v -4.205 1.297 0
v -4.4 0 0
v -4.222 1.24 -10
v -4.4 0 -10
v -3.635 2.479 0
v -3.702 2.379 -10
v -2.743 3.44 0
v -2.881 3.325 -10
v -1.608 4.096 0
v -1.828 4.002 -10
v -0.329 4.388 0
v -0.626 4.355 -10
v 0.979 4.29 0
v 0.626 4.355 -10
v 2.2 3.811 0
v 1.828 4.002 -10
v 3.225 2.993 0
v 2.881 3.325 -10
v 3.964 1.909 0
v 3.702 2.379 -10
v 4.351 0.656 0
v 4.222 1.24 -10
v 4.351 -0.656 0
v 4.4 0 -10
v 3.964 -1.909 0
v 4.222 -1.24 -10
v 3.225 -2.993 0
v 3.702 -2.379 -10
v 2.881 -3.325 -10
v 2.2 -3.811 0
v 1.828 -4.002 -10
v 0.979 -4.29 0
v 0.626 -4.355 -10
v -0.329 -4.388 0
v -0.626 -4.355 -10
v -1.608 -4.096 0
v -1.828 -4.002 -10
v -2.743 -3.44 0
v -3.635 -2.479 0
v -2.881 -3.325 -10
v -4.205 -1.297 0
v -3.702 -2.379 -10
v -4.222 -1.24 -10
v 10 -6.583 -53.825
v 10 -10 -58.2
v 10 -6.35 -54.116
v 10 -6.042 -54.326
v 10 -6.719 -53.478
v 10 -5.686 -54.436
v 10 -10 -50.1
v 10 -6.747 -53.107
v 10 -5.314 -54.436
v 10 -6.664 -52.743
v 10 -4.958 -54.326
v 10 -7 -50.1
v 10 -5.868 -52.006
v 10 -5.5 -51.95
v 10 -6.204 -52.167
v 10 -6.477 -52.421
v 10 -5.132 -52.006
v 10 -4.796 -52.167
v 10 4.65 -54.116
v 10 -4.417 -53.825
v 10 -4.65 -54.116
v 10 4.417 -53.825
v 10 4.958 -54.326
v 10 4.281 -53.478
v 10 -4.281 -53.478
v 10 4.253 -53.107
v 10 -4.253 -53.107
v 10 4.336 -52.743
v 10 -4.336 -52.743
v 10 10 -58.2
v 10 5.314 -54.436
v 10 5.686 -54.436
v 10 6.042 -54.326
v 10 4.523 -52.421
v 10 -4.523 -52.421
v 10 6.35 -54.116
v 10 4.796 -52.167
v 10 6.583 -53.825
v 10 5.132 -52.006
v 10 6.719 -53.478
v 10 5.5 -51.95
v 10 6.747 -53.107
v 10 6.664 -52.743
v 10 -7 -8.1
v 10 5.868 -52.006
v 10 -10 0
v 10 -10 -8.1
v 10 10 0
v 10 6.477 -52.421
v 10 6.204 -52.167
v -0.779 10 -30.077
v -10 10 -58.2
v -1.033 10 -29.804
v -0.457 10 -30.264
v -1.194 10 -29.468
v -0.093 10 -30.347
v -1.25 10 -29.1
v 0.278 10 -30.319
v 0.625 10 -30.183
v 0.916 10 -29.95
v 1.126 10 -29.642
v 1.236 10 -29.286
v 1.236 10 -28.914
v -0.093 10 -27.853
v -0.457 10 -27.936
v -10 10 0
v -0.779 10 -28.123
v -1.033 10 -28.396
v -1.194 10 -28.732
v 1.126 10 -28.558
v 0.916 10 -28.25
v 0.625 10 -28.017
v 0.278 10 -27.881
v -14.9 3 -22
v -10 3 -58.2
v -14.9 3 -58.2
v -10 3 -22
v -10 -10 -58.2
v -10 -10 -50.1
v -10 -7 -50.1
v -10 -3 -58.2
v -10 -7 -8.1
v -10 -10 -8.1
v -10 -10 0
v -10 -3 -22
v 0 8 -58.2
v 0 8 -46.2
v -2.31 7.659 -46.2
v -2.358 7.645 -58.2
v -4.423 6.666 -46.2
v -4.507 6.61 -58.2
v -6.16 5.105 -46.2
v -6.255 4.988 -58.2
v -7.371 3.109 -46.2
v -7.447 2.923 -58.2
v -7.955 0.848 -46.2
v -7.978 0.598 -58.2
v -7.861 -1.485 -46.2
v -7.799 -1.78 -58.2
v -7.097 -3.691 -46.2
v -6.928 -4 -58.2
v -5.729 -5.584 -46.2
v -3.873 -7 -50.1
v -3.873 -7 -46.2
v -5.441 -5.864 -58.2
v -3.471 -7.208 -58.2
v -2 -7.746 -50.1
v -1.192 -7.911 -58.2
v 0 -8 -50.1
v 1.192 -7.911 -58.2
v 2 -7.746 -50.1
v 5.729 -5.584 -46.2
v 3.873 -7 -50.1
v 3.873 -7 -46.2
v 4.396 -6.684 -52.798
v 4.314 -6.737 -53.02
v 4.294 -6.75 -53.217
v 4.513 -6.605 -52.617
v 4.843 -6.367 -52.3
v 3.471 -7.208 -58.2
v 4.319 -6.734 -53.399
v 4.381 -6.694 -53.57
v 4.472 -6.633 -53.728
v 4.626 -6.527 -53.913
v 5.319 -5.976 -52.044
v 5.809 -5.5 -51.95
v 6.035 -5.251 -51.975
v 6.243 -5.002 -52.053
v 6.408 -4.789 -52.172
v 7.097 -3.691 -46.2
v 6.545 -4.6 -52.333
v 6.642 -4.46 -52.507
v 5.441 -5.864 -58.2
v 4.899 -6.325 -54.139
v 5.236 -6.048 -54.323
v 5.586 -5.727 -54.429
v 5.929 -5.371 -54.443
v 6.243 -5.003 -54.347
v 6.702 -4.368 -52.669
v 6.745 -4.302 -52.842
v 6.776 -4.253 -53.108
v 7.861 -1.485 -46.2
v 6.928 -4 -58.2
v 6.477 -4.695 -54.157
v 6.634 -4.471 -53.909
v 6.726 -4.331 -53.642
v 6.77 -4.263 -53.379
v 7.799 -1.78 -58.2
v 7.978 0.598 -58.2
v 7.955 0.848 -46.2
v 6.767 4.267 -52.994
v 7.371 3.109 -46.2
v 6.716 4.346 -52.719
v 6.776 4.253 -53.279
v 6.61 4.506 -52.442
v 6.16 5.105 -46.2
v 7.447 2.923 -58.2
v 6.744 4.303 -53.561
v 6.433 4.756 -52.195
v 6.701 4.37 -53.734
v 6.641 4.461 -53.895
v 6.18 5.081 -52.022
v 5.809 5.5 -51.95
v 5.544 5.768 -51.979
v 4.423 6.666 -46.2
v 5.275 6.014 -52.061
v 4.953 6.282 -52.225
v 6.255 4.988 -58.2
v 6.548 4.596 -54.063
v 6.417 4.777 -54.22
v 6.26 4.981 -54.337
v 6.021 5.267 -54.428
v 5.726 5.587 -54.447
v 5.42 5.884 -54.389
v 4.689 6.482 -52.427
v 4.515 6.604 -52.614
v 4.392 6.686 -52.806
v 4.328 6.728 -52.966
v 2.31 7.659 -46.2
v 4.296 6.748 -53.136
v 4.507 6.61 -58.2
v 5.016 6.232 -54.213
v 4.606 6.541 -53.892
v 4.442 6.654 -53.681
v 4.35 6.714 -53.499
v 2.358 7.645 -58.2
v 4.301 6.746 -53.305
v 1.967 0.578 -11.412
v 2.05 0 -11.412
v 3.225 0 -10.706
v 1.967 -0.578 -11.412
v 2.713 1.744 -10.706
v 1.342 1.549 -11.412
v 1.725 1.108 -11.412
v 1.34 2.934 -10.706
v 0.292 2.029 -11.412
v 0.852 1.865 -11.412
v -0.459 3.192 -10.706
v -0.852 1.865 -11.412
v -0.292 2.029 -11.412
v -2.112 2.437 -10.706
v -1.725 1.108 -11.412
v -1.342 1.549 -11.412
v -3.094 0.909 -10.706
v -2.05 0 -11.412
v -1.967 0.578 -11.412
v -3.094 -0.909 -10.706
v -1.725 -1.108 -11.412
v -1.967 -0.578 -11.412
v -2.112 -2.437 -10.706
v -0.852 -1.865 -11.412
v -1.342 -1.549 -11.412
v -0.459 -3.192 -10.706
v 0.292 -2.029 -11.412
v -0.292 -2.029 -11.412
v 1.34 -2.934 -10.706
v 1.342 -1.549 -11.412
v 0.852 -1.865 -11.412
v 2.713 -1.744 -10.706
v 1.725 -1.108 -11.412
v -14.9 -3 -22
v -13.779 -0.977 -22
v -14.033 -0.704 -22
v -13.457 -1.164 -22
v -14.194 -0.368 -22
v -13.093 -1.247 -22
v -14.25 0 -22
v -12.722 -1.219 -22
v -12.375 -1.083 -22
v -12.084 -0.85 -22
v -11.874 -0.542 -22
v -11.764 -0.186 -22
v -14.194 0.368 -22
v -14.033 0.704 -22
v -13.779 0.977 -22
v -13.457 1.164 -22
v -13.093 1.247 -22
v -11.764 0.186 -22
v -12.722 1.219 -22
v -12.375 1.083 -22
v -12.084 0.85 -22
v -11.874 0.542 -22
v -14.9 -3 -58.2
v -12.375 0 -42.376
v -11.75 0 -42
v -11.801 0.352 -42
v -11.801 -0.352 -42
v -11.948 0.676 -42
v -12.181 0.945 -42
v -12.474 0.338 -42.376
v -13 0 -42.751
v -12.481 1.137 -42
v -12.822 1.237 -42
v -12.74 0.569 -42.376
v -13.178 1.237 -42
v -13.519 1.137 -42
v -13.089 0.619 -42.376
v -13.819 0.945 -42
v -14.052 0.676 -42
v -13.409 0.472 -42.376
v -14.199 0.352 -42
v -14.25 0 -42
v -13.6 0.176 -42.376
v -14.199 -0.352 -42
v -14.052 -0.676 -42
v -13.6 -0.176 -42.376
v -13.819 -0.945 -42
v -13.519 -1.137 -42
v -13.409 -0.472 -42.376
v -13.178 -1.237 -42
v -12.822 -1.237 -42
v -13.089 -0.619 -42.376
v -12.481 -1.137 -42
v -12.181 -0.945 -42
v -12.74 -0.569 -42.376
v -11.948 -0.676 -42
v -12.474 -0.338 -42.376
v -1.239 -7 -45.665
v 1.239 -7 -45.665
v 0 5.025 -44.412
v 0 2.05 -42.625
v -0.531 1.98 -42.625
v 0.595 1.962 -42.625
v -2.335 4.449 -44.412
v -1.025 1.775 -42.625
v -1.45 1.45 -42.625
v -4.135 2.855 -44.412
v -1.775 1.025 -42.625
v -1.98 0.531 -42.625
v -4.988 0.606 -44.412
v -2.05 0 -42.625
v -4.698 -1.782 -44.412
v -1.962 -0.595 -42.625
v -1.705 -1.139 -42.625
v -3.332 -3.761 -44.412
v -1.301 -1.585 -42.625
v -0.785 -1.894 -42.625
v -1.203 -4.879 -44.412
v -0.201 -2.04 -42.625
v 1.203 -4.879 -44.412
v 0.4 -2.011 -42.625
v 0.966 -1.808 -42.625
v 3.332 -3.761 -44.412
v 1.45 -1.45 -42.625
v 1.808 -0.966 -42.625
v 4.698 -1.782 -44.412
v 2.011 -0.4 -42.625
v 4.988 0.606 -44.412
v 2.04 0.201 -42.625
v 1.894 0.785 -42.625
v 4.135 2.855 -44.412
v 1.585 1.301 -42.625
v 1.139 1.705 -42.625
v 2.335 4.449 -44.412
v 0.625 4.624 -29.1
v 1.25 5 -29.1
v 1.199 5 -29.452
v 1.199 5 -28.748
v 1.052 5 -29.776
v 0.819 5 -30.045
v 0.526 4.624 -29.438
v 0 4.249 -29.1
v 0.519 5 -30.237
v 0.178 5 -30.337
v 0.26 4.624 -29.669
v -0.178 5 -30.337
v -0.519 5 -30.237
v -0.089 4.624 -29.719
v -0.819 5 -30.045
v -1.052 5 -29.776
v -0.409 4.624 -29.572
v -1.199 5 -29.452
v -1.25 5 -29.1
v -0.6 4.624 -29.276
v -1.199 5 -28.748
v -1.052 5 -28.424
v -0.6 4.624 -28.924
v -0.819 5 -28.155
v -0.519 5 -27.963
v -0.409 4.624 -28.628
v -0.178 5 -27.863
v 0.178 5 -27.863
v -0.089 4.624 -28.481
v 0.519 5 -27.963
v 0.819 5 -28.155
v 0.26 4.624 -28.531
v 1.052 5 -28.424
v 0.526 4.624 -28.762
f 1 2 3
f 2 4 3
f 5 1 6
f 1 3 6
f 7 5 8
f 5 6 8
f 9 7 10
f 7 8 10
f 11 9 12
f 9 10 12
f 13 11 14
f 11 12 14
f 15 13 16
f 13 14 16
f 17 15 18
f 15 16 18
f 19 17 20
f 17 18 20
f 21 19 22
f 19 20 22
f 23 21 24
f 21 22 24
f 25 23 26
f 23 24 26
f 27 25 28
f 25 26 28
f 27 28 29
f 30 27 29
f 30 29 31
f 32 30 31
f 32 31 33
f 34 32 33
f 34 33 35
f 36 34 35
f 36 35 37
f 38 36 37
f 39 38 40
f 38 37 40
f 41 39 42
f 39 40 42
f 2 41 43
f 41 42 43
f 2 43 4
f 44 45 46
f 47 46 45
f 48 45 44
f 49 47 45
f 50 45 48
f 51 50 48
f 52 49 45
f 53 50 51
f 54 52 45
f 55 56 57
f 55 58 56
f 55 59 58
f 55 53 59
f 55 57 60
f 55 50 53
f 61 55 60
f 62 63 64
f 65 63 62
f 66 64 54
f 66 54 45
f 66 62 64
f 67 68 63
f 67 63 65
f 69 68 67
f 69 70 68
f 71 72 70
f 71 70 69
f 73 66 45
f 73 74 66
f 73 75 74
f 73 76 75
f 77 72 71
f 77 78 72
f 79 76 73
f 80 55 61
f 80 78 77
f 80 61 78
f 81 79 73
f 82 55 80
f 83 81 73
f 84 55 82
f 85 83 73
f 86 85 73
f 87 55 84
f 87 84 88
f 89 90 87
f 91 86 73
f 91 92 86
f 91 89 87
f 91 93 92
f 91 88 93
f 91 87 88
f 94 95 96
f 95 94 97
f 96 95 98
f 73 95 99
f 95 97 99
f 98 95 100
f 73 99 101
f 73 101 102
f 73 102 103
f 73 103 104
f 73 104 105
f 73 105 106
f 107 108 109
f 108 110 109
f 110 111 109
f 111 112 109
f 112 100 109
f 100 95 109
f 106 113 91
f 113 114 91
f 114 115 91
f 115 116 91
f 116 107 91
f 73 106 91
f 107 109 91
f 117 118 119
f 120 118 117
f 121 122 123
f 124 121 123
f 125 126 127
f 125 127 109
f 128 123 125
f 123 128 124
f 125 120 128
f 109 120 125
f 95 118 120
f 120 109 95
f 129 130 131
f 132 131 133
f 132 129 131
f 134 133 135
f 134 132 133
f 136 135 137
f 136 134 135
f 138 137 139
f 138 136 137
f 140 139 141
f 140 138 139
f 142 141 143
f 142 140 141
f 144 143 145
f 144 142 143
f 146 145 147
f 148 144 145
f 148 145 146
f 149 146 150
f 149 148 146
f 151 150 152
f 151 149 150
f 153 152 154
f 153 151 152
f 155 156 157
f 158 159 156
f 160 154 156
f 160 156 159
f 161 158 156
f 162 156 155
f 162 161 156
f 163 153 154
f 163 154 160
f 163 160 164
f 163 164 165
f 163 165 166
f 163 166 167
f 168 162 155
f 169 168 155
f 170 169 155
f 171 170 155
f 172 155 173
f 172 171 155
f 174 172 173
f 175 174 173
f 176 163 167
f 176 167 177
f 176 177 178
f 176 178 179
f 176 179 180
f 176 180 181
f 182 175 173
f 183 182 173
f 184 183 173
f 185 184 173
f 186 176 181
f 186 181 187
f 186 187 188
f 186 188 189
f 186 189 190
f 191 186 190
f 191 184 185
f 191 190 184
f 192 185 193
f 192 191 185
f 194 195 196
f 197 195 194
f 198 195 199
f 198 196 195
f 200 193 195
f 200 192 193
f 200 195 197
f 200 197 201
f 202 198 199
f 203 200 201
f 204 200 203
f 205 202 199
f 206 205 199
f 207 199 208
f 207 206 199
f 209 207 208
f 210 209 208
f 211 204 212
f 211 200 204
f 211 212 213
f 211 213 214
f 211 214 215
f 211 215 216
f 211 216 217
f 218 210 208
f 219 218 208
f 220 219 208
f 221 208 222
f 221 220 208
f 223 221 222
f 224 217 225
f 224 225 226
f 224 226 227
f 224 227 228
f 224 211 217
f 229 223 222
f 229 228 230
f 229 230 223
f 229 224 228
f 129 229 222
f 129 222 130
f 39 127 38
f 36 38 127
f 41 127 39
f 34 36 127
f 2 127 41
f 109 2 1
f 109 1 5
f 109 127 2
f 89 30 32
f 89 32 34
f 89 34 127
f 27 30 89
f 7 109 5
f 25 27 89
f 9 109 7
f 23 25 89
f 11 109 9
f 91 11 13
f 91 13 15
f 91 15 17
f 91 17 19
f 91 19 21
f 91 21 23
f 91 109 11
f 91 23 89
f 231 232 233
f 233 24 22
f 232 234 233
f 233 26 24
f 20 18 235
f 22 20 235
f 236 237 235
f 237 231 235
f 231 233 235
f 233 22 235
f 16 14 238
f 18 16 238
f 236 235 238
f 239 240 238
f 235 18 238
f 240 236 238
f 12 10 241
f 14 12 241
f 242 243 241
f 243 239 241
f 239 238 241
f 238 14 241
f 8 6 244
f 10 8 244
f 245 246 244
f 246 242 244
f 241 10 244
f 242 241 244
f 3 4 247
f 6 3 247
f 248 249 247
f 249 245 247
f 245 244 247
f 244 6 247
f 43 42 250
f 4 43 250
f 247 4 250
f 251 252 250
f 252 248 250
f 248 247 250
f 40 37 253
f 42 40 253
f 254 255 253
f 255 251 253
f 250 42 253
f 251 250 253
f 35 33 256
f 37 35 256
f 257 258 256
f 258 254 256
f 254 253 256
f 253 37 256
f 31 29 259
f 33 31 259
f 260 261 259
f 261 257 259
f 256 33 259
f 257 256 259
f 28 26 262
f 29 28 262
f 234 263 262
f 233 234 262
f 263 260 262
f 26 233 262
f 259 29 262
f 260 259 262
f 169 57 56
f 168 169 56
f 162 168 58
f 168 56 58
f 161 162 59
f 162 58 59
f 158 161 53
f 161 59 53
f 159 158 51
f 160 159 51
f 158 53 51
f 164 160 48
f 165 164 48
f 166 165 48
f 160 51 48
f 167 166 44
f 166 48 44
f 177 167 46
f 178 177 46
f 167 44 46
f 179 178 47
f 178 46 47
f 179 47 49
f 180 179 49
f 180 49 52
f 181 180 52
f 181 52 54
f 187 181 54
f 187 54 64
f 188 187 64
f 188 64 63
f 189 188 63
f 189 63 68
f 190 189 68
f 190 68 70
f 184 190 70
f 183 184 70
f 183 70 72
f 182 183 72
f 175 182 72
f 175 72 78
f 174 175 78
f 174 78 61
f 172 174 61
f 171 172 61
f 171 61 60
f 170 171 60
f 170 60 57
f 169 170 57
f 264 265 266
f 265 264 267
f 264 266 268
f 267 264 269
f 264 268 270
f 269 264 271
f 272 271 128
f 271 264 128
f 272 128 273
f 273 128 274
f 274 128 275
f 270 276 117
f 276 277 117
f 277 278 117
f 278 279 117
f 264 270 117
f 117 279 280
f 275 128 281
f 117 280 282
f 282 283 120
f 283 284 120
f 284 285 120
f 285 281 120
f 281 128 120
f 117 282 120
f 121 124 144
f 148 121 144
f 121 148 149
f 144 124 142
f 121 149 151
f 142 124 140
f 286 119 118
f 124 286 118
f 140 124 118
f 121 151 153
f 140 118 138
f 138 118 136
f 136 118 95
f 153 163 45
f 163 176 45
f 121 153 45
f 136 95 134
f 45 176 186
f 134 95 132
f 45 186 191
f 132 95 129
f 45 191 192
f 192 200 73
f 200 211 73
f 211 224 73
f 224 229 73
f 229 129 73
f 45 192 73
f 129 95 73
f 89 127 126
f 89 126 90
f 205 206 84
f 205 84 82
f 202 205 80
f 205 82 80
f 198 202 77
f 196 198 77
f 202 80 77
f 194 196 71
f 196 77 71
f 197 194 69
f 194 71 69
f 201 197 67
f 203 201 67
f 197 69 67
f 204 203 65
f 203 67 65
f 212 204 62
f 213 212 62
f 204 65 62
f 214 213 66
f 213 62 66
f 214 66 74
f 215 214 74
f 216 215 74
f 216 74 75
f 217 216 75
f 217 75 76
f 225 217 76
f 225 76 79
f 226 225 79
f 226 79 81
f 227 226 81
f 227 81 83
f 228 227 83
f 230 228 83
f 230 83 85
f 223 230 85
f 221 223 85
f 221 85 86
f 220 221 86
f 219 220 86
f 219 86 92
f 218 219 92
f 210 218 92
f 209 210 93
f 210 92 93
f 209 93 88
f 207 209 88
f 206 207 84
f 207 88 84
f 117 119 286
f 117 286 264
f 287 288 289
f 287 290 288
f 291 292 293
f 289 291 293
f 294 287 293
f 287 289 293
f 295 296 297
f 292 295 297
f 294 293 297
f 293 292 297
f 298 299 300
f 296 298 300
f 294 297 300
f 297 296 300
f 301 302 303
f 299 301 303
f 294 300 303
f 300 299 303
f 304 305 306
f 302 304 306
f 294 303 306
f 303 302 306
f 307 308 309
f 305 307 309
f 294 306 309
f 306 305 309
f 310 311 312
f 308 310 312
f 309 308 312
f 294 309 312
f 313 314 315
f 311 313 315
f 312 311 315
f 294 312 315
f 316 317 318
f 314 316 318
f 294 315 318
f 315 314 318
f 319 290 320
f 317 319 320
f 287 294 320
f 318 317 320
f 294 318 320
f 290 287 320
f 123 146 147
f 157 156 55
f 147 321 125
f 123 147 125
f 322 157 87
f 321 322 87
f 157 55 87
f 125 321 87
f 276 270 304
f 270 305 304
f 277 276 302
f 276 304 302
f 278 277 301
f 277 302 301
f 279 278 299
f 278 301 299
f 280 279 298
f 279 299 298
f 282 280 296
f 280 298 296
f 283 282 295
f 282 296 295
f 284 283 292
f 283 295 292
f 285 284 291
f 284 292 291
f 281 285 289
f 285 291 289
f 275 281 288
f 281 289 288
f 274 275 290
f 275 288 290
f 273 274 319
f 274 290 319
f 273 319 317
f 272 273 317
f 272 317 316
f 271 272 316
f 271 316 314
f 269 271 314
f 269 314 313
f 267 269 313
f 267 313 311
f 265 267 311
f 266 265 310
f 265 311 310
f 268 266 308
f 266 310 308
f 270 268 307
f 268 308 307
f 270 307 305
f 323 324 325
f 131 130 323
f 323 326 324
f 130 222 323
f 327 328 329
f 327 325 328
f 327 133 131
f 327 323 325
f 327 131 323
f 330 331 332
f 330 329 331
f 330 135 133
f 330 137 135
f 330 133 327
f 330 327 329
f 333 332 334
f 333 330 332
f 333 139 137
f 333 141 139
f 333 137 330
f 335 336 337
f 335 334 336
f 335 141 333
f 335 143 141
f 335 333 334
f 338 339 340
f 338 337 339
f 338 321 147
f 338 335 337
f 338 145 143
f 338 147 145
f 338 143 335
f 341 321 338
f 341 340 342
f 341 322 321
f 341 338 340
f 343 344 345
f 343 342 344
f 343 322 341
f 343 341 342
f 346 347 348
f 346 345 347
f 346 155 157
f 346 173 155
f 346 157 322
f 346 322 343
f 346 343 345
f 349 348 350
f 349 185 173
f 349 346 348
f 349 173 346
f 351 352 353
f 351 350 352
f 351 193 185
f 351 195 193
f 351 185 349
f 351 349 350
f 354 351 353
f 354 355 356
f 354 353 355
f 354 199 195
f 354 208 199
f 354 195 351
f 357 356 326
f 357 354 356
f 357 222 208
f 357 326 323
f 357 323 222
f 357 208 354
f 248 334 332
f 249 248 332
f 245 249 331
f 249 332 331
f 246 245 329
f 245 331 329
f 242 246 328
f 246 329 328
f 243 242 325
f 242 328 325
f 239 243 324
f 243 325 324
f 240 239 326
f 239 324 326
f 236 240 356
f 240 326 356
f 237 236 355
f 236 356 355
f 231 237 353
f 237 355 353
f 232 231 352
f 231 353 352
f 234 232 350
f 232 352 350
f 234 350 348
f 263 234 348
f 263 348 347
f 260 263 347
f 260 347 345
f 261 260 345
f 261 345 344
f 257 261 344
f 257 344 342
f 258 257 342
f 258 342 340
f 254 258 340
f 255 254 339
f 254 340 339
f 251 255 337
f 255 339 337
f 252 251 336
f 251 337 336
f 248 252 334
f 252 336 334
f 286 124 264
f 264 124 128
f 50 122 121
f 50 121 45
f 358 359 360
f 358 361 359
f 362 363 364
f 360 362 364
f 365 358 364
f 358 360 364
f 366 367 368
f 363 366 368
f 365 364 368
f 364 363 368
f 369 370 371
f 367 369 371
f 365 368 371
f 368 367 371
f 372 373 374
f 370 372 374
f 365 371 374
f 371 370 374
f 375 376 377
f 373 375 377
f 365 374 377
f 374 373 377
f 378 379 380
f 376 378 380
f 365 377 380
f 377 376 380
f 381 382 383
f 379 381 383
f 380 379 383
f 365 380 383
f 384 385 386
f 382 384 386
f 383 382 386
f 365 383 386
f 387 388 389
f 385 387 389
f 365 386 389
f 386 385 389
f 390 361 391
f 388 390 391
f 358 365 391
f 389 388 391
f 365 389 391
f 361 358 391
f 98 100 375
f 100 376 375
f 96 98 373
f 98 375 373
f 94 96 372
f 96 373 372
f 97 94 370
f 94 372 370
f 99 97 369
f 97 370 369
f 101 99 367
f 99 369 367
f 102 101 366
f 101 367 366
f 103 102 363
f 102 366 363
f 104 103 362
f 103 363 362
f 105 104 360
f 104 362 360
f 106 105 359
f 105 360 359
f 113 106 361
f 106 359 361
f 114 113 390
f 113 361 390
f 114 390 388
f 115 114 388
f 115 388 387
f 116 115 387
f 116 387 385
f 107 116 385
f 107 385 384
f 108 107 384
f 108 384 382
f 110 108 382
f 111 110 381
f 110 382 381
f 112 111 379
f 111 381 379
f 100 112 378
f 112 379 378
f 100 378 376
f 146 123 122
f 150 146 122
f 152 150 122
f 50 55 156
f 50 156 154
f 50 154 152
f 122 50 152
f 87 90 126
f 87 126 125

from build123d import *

# Parameters (mm, degrees)
SCHIZZO1_W                   = 20
SCHIZZO1_H                   = 20
ESTRUSIONE_ESTRUSIONE1_DEPTH = 58.2
SCHIZZO2_R                   = 2.05
TAGLIO_ESTRUSIONE1_DEPTH     = 60.893572276
FORO_FILETTATO_G1_8_1_D      = 8.8
FORO_FILETTATO_G1_8_1_DEPTH  = 10
FORO_FILETTATO_G1_8_1_TIP    = 2.643786724
M3_TAPPED_HOLE2_D            = 2.5
M3_TAPPED_HOLE2_DEPTH        = 5
M3_TAPPED_HOLE2_TIP          = 0.751075774
M3_TAPPED_HOLE3_REACH        = 60.911
M3_TAPPED_HOLE3_BORE_R       = 1.25
SKETCH1_W                    = 36.2
SKETCH1_H                    = 6
BOSS_EXTRUDE1_DEPTH          = 4.9
CUT_EXTRUDE1_DEPTH           = 65.087830449
M3_TAPPED_HOLE4_D            = 2.5
M3_TAPPED_HOLE4_DEPTH        = 20
M3_TAPPED_HOLE4_TIP          = 0.751075774


with BuildPart() as part:
    # Schizzo1 → Estrusione-Estrusione1 (new body)
    with BuildSketch(Plane.XY):
        Rectangle(SCHIZZO1_W, SCHIZZO1_H)
    extrude(amount=-ESTRUSIONE_ESTRUSIONE1_DEPTH)

    # Schizzo2 → Taglio-Estrusione1 (cut, through all)
    with BuildSketch(Plane(origin=(0, 0, -58.2), x_dir=(-1, 0, 0), z_dir=(0, 0, -1))):
        Circle(SCHIZZO2_R)
    extrude(amount=-TAGLIO_ESTRUSIONE1_DEPTH, mode=Mode.SUBTRACT)

    # Foro filettato G1/8-1
    with Locations(Plane.XY):
        with Locations((0, 0)):
            Hole(FORO_FILETTATO_G1_8_1_D / 2, depth=FORO_FILETTATO_G1_8_1_DEPTH)
            with Locations((0, 0, -(FORO_FILETTATO_G1_8_1_DEPTH + FORO_FILETTATO_G1_8_1_TIP / 2))):  # 118° drill point
                Cone(0, FORO_FILETTATO_G1_8_1_D / 2, FORO_FILETTATO_G1_8_1_TIP, mode=Mode.SUBTRACT)

    # M3 Tapped Hole2
    with Locations(Plane(origin=(0, 10, -29.1), x_dir=(1, 0, 0), z_dir=(0, 1, 0))):
        with Locations((0, 0)):
            Hole(M3_TAPPED_HOLE2_D / 2, depth=M3_TAPPED_HOLE2_DEPTH)
            with Locations((0, 0, -(M3_TAPPED_HOLE2_DEPTH + M3_TAPPED_HOLE2_TIP / 2))):  # 118° drill point
                Cone(0, M3_TAPPED_HOLE2_D / 2, M3_TAPPED_HOLE2_TIP, mode=Mode.SUBTRACT)

    # Schizzo14 → Foro Ø16.0 (16)-1 (revolve, cut)
    with BuildSketch(Plane(origin=(0, 0, -58.2), x_dir=(0, 1, 0), z_dir=(1, 0, 0))):
        Polygon((0, 0), (0, 16.806884952), (8, 12), (8, 0), align=None)
    revolve(axis=Axis((0, 0, -64.55), (0, 0, 1)), mode=Mode.SUBTRACT)

    # M3 Tapped Hole3 bore (on position points) → M3 Tapped Hole3 (cut, up to next)
    with BuildSketch(Plane(origin=(10, 5.5, -53.2), x_dir=(0, 0, 1), z_dir=(1, 0, 0)), mode=Mode.PRIVATE) as m3_tapped_hole3_sk1:
        Circle(M3_TAPPED_HOLE3_BORE_R)
    m3_tapped_hole3_tool1 = extrude(m3_tapped_hole3_sk1.sketch, amount=-M3_TAPPED_HOLE3_REACH, mode=Mode.PRIVATE) & part.part
    # M3 Tapped Hole3 bore (on position points) → M3 Tapped Hole3 (cut, up to next)
    with BuildSketch(Plane(origin=(10, 5.5, -53.2), x_dir=(0, 0, 1), z_dir=(1, 0, 0)), mode=Mode.PRIVATE) as m3_tapped_hole3_sk2:
        with Locations((0, 11)):
            Circle(M3_TAPPED_HOLE3_BORE_R)
    m3_tapped_hole3_tool2 = extrude(m3_tapped_hole3_sk2.sketch, amount=-M3_TAPPED_HOLE3_REACH, mode=Mode.PRIVATE) & part.part
    add(m3_tapped_hole3_tool1.solids().sort_by_distance((10, 5.5, -53.2))[0], mode=Mode.SUBTRACT)
    add(m3_tapped_hole3_tool2.solids().sort_by_distance((10, -5.5, -53.2))[0], mode=Mode.SUBTRACT)

    # Sketch1 → Boss-Extrude1 (add)
    with BuildSketch(Plane.ZY.offset(10)):
        with Locations((-40.1, 0)):
            Rectangle(SKETCH1_W, SKETCH1_H)
    extrude(amount=BOSS_EXTRUDE1_DEPTH)

    # Sketch2 → Cut-Extrude1 (cut, through all)
    with BuildSketch(Plane(origin=(10, 0, 0), x_dir=(0, 0, -1), z_dir=(1, 0, 0))):
        Polygon((50.1, -10), (34.1, -10), (8.1, -10), (8.1, -7), (34.1, -7), (50.1, -7), align=None)
    extrude(amount=-CUT_EXTRUDE1_DEPTH, mode=Mode.SUBTRACT)

    # M3 Tapped Hole4
    with Locations(Plane.XY.offset(-22)):
        with Locations((-13, 0)):
            Hole(M3_TAPPED_HOLE4_D / 2, depth=M3_TAPPED_HOLE4_DEPTH)
            with Locations((0, 0, -(M3_TAPPED_HOLE4_DEPTH + M3_TAPPED_HOLE4_TIP / 2))):  # 118° drill point
                Cone(0, M3_TAPPED_HOLE4_D / 2, M3_TAPPED_HOLE4_TIP, mode=Mode.SUBTRACT)


solid = part.part
